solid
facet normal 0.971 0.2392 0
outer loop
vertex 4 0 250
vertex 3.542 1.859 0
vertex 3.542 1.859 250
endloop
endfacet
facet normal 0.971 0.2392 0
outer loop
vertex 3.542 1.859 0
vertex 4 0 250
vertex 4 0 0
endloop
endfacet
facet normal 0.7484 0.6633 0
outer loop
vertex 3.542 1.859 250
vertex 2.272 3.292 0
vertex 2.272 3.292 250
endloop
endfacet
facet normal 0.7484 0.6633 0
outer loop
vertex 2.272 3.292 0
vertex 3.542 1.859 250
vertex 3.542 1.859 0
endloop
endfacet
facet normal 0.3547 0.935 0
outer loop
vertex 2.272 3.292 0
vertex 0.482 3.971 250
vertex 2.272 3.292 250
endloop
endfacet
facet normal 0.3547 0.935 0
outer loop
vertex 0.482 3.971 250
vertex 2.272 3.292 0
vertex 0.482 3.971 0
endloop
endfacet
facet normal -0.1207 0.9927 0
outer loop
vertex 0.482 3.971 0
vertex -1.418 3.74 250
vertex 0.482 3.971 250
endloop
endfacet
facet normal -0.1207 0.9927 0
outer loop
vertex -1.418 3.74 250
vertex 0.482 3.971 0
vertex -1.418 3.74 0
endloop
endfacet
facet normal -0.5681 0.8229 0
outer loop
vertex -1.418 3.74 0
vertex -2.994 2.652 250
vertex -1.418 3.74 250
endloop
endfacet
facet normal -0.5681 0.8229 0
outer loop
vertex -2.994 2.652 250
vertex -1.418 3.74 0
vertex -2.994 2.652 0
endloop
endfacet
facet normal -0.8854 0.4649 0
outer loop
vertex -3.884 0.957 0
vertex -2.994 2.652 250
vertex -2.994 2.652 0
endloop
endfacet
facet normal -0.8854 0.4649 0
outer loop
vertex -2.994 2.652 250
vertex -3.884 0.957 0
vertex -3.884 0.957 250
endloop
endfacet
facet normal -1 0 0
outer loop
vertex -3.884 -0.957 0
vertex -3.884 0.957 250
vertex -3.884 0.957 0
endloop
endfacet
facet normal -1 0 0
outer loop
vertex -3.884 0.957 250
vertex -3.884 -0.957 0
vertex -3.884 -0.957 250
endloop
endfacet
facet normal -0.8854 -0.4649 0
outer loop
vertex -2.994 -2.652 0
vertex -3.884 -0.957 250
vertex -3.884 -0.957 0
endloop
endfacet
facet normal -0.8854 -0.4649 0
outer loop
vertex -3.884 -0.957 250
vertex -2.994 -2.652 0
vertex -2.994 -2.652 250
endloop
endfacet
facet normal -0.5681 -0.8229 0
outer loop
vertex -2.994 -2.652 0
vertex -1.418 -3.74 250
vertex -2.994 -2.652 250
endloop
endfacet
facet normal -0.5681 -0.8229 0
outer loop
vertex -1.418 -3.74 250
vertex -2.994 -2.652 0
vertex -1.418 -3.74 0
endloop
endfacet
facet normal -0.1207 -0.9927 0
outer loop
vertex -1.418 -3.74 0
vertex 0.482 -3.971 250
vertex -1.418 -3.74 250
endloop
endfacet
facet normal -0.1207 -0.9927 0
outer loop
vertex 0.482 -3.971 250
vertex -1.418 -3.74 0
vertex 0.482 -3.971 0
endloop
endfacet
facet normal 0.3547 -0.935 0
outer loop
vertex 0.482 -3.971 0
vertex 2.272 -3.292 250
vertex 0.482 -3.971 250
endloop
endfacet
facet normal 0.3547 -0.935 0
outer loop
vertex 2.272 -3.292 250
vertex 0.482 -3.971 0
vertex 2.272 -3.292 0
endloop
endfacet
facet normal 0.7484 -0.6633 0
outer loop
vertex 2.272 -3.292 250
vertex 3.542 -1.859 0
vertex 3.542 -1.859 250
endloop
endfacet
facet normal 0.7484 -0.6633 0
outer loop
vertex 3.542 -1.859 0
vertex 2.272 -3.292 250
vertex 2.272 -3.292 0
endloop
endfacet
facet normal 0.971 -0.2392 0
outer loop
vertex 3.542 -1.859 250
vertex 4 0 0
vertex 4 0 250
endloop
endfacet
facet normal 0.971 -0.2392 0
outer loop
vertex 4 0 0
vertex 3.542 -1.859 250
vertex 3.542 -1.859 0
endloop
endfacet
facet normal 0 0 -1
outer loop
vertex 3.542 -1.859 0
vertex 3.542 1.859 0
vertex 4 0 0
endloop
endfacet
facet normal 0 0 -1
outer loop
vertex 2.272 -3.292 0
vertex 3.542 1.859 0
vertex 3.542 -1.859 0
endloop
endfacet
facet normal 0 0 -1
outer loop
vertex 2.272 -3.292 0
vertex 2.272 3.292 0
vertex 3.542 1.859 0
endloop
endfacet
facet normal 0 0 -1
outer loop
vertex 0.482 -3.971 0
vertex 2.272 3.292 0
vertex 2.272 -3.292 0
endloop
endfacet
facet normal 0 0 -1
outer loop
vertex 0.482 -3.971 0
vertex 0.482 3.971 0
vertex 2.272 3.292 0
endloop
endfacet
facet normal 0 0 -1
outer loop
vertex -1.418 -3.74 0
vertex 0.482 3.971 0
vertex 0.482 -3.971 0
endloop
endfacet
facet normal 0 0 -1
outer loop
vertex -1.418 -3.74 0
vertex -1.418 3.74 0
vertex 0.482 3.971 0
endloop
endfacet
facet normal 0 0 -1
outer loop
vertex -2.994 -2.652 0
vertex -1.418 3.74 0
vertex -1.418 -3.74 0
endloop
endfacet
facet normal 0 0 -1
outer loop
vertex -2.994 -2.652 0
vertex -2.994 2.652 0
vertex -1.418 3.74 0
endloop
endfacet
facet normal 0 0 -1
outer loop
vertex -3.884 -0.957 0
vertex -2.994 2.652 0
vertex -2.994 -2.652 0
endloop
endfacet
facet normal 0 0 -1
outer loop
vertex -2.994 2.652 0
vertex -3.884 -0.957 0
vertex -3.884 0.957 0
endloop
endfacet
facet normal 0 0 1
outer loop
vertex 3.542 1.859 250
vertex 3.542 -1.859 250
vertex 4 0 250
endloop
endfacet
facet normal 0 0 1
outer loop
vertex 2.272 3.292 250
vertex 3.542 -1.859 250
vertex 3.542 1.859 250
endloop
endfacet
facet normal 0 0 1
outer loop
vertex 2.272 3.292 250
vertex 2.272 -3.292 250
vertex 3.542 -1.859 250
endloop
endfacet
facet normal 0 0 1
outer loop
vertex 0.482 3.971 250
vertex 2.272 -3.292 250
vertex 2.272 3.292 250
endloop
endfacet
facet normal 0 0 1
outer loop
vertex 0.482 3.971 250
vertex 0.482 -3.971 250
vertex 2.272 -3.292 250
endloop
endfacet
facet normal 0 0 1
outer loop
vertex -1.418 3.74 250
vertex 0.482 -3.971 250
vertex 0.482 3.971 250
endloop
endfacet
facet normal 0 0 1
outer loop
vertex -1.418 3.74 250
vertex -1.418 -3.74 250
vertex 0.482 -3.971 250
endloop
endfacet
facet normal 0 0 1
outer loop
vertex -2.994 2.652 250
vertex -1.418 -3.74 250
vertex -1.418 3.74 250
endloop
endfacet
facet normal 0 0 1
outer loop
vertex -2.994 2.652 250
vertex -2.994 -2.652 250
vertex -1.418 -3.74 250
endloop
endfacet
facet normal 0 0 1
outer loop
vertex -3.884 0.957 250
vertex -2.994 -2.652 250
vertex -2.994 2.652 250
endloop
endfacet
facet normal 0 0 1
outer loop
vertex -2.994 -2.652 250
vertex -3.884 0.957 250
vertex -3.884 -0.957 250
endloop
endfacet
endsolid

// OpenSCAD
// file: ../machine.scad
/*
 * Helpers for machinging; i.e. kerf alowances
 *
 * Copyright 2013 <b@Zi.iS>
 * License CC BY 3.0
 */

ZCUT = 0;
XOFF = 0;
YOFF = 0;

module drawing() {
	//create blueprint
	if(preview==0) {
		projection(cut=true) translate([
			XOFF,
			YOFF,
			ZCUT
		]) {
            if($children) children([0:$children-1]);
		}
	} else {
        if($children) children([0:$children-1]);
	}
}

module kerf_cube(
	size
) {
	translate([
		kerf/2*(1-preview),
		kerf/2*(1-preview),
		0
	]) {
		cube([
			size[0] - kerf*(1-preview),
			size[1] - kerf*(1-preview),
			size[2]
		]);
	}
}

module kerf_cylinder(
	r,
	h
) {
	cylinder(
		r = r - kerf/2*(1-preview),
		h = h
	);
}

module part(
	id,
	name
) {
	if(PART<1 || PART==id || id<0) {
		if(id>=0) echo(str("PART", id, ":", name));
        if($children) children([0:$children-1]);
	}	
}
// file: ../easing.scad
/*
 * Make allowances to ensure good fit.
 *
 * Copyright 2013 <b@Zi.iS>
 * License CC BY 3.0
 */

function ease(value) = min(value*1.1, value + .2);
// file: ../epslion.scad
/*
 * Slightly offset previews to overcome rounding issues
 *
 * Copyright 2013 <b@Zi.iS>
 * License CC BY 3.0
 */

include <config.scad>;

module e(
	shift = -.1,
	size = 1.1
) {
	if(preview == 1) {
		translate([
			0,
			0,
			shift
		]) {
			scale([
				1,
				1,
				size
			]) {
                if($children) children([0:$children-1]);
			}
		}
	} else {
        if($children) children([0:$children-1]);
	}
}

function space(pitch, i) = -pitch/2 + pitch*i;
// file: ../config.scad
/*
 * Default settings
 *
 * Copyright 2013 <b@Zi.iS>
 * License CC BY 3.0
 */

preview = 1;
$fa = 6;
$fs = 2 - 1.5*(1-preview);
kerf = .3;
PART = 0; //all

// preview colors
color_steel = [.8, .8, .8];
color_wood = [.3, .3, 0];
color_print = [0, .8, 0];
color_plastic = [.7, 1, .7];
color_brass = [181/255, 166/255, 66/255];
color_acrylic = [.9,.9,.9,.5];
// file: ../main.scad
/*
 * A library to make SCAD easier.
 *
 * Copyright 2013 <b@Zi.iS>
 * License CC BY 3.0
 */

include <config.scad>;
use <epslion.scad>;
use <easing.scad>;
include <machine.scad>;
// main file
/*
 * Rod
 *
 * Copyright 2013 <b@Zi.iS>
 * License CC BY 3.0
 */

include <../main.scad>;

rod();

module rod(
	r = 8/2,
	h = 250,
	id
) {
	part(id, str("Smooth rod ", r*2, "mm x ", h, "mm"))
	color(color_steel) {
		cylinder(
			r = r,
			h = h
		);
	}
	translate([
		0,
		0,
		h
	] * preview) {
		if($children) children([0:$children-1]);
	}
}

module threaded_rod(
	r = 8/2,
	h = 250,
	pitch = 1.26,
	id
) {
	part(id, str("Threaded rod ", r*2, "mm x ", h, "mm")) {
		color([.5,.5,.5]) cylinder(
			r = r*.8,
			h = h
		);
	
		color([.7,.7,.7,.5]) cylinder(
			r = r,
			h = h
		);
	
		/* Proper version but too slow
		color(color_steel) {
			linear_extrude(
				height = h,
				twist = -h/pitch*360
			) {
				translate([.866*pitch,0,0]) {
					circle(
						r=r 
					);
				}
			}
		}*/
	}

	translate([
		0,
		0,
		h
	] * preview) {
        if($children) children([0:$children-1]);
	}
}
